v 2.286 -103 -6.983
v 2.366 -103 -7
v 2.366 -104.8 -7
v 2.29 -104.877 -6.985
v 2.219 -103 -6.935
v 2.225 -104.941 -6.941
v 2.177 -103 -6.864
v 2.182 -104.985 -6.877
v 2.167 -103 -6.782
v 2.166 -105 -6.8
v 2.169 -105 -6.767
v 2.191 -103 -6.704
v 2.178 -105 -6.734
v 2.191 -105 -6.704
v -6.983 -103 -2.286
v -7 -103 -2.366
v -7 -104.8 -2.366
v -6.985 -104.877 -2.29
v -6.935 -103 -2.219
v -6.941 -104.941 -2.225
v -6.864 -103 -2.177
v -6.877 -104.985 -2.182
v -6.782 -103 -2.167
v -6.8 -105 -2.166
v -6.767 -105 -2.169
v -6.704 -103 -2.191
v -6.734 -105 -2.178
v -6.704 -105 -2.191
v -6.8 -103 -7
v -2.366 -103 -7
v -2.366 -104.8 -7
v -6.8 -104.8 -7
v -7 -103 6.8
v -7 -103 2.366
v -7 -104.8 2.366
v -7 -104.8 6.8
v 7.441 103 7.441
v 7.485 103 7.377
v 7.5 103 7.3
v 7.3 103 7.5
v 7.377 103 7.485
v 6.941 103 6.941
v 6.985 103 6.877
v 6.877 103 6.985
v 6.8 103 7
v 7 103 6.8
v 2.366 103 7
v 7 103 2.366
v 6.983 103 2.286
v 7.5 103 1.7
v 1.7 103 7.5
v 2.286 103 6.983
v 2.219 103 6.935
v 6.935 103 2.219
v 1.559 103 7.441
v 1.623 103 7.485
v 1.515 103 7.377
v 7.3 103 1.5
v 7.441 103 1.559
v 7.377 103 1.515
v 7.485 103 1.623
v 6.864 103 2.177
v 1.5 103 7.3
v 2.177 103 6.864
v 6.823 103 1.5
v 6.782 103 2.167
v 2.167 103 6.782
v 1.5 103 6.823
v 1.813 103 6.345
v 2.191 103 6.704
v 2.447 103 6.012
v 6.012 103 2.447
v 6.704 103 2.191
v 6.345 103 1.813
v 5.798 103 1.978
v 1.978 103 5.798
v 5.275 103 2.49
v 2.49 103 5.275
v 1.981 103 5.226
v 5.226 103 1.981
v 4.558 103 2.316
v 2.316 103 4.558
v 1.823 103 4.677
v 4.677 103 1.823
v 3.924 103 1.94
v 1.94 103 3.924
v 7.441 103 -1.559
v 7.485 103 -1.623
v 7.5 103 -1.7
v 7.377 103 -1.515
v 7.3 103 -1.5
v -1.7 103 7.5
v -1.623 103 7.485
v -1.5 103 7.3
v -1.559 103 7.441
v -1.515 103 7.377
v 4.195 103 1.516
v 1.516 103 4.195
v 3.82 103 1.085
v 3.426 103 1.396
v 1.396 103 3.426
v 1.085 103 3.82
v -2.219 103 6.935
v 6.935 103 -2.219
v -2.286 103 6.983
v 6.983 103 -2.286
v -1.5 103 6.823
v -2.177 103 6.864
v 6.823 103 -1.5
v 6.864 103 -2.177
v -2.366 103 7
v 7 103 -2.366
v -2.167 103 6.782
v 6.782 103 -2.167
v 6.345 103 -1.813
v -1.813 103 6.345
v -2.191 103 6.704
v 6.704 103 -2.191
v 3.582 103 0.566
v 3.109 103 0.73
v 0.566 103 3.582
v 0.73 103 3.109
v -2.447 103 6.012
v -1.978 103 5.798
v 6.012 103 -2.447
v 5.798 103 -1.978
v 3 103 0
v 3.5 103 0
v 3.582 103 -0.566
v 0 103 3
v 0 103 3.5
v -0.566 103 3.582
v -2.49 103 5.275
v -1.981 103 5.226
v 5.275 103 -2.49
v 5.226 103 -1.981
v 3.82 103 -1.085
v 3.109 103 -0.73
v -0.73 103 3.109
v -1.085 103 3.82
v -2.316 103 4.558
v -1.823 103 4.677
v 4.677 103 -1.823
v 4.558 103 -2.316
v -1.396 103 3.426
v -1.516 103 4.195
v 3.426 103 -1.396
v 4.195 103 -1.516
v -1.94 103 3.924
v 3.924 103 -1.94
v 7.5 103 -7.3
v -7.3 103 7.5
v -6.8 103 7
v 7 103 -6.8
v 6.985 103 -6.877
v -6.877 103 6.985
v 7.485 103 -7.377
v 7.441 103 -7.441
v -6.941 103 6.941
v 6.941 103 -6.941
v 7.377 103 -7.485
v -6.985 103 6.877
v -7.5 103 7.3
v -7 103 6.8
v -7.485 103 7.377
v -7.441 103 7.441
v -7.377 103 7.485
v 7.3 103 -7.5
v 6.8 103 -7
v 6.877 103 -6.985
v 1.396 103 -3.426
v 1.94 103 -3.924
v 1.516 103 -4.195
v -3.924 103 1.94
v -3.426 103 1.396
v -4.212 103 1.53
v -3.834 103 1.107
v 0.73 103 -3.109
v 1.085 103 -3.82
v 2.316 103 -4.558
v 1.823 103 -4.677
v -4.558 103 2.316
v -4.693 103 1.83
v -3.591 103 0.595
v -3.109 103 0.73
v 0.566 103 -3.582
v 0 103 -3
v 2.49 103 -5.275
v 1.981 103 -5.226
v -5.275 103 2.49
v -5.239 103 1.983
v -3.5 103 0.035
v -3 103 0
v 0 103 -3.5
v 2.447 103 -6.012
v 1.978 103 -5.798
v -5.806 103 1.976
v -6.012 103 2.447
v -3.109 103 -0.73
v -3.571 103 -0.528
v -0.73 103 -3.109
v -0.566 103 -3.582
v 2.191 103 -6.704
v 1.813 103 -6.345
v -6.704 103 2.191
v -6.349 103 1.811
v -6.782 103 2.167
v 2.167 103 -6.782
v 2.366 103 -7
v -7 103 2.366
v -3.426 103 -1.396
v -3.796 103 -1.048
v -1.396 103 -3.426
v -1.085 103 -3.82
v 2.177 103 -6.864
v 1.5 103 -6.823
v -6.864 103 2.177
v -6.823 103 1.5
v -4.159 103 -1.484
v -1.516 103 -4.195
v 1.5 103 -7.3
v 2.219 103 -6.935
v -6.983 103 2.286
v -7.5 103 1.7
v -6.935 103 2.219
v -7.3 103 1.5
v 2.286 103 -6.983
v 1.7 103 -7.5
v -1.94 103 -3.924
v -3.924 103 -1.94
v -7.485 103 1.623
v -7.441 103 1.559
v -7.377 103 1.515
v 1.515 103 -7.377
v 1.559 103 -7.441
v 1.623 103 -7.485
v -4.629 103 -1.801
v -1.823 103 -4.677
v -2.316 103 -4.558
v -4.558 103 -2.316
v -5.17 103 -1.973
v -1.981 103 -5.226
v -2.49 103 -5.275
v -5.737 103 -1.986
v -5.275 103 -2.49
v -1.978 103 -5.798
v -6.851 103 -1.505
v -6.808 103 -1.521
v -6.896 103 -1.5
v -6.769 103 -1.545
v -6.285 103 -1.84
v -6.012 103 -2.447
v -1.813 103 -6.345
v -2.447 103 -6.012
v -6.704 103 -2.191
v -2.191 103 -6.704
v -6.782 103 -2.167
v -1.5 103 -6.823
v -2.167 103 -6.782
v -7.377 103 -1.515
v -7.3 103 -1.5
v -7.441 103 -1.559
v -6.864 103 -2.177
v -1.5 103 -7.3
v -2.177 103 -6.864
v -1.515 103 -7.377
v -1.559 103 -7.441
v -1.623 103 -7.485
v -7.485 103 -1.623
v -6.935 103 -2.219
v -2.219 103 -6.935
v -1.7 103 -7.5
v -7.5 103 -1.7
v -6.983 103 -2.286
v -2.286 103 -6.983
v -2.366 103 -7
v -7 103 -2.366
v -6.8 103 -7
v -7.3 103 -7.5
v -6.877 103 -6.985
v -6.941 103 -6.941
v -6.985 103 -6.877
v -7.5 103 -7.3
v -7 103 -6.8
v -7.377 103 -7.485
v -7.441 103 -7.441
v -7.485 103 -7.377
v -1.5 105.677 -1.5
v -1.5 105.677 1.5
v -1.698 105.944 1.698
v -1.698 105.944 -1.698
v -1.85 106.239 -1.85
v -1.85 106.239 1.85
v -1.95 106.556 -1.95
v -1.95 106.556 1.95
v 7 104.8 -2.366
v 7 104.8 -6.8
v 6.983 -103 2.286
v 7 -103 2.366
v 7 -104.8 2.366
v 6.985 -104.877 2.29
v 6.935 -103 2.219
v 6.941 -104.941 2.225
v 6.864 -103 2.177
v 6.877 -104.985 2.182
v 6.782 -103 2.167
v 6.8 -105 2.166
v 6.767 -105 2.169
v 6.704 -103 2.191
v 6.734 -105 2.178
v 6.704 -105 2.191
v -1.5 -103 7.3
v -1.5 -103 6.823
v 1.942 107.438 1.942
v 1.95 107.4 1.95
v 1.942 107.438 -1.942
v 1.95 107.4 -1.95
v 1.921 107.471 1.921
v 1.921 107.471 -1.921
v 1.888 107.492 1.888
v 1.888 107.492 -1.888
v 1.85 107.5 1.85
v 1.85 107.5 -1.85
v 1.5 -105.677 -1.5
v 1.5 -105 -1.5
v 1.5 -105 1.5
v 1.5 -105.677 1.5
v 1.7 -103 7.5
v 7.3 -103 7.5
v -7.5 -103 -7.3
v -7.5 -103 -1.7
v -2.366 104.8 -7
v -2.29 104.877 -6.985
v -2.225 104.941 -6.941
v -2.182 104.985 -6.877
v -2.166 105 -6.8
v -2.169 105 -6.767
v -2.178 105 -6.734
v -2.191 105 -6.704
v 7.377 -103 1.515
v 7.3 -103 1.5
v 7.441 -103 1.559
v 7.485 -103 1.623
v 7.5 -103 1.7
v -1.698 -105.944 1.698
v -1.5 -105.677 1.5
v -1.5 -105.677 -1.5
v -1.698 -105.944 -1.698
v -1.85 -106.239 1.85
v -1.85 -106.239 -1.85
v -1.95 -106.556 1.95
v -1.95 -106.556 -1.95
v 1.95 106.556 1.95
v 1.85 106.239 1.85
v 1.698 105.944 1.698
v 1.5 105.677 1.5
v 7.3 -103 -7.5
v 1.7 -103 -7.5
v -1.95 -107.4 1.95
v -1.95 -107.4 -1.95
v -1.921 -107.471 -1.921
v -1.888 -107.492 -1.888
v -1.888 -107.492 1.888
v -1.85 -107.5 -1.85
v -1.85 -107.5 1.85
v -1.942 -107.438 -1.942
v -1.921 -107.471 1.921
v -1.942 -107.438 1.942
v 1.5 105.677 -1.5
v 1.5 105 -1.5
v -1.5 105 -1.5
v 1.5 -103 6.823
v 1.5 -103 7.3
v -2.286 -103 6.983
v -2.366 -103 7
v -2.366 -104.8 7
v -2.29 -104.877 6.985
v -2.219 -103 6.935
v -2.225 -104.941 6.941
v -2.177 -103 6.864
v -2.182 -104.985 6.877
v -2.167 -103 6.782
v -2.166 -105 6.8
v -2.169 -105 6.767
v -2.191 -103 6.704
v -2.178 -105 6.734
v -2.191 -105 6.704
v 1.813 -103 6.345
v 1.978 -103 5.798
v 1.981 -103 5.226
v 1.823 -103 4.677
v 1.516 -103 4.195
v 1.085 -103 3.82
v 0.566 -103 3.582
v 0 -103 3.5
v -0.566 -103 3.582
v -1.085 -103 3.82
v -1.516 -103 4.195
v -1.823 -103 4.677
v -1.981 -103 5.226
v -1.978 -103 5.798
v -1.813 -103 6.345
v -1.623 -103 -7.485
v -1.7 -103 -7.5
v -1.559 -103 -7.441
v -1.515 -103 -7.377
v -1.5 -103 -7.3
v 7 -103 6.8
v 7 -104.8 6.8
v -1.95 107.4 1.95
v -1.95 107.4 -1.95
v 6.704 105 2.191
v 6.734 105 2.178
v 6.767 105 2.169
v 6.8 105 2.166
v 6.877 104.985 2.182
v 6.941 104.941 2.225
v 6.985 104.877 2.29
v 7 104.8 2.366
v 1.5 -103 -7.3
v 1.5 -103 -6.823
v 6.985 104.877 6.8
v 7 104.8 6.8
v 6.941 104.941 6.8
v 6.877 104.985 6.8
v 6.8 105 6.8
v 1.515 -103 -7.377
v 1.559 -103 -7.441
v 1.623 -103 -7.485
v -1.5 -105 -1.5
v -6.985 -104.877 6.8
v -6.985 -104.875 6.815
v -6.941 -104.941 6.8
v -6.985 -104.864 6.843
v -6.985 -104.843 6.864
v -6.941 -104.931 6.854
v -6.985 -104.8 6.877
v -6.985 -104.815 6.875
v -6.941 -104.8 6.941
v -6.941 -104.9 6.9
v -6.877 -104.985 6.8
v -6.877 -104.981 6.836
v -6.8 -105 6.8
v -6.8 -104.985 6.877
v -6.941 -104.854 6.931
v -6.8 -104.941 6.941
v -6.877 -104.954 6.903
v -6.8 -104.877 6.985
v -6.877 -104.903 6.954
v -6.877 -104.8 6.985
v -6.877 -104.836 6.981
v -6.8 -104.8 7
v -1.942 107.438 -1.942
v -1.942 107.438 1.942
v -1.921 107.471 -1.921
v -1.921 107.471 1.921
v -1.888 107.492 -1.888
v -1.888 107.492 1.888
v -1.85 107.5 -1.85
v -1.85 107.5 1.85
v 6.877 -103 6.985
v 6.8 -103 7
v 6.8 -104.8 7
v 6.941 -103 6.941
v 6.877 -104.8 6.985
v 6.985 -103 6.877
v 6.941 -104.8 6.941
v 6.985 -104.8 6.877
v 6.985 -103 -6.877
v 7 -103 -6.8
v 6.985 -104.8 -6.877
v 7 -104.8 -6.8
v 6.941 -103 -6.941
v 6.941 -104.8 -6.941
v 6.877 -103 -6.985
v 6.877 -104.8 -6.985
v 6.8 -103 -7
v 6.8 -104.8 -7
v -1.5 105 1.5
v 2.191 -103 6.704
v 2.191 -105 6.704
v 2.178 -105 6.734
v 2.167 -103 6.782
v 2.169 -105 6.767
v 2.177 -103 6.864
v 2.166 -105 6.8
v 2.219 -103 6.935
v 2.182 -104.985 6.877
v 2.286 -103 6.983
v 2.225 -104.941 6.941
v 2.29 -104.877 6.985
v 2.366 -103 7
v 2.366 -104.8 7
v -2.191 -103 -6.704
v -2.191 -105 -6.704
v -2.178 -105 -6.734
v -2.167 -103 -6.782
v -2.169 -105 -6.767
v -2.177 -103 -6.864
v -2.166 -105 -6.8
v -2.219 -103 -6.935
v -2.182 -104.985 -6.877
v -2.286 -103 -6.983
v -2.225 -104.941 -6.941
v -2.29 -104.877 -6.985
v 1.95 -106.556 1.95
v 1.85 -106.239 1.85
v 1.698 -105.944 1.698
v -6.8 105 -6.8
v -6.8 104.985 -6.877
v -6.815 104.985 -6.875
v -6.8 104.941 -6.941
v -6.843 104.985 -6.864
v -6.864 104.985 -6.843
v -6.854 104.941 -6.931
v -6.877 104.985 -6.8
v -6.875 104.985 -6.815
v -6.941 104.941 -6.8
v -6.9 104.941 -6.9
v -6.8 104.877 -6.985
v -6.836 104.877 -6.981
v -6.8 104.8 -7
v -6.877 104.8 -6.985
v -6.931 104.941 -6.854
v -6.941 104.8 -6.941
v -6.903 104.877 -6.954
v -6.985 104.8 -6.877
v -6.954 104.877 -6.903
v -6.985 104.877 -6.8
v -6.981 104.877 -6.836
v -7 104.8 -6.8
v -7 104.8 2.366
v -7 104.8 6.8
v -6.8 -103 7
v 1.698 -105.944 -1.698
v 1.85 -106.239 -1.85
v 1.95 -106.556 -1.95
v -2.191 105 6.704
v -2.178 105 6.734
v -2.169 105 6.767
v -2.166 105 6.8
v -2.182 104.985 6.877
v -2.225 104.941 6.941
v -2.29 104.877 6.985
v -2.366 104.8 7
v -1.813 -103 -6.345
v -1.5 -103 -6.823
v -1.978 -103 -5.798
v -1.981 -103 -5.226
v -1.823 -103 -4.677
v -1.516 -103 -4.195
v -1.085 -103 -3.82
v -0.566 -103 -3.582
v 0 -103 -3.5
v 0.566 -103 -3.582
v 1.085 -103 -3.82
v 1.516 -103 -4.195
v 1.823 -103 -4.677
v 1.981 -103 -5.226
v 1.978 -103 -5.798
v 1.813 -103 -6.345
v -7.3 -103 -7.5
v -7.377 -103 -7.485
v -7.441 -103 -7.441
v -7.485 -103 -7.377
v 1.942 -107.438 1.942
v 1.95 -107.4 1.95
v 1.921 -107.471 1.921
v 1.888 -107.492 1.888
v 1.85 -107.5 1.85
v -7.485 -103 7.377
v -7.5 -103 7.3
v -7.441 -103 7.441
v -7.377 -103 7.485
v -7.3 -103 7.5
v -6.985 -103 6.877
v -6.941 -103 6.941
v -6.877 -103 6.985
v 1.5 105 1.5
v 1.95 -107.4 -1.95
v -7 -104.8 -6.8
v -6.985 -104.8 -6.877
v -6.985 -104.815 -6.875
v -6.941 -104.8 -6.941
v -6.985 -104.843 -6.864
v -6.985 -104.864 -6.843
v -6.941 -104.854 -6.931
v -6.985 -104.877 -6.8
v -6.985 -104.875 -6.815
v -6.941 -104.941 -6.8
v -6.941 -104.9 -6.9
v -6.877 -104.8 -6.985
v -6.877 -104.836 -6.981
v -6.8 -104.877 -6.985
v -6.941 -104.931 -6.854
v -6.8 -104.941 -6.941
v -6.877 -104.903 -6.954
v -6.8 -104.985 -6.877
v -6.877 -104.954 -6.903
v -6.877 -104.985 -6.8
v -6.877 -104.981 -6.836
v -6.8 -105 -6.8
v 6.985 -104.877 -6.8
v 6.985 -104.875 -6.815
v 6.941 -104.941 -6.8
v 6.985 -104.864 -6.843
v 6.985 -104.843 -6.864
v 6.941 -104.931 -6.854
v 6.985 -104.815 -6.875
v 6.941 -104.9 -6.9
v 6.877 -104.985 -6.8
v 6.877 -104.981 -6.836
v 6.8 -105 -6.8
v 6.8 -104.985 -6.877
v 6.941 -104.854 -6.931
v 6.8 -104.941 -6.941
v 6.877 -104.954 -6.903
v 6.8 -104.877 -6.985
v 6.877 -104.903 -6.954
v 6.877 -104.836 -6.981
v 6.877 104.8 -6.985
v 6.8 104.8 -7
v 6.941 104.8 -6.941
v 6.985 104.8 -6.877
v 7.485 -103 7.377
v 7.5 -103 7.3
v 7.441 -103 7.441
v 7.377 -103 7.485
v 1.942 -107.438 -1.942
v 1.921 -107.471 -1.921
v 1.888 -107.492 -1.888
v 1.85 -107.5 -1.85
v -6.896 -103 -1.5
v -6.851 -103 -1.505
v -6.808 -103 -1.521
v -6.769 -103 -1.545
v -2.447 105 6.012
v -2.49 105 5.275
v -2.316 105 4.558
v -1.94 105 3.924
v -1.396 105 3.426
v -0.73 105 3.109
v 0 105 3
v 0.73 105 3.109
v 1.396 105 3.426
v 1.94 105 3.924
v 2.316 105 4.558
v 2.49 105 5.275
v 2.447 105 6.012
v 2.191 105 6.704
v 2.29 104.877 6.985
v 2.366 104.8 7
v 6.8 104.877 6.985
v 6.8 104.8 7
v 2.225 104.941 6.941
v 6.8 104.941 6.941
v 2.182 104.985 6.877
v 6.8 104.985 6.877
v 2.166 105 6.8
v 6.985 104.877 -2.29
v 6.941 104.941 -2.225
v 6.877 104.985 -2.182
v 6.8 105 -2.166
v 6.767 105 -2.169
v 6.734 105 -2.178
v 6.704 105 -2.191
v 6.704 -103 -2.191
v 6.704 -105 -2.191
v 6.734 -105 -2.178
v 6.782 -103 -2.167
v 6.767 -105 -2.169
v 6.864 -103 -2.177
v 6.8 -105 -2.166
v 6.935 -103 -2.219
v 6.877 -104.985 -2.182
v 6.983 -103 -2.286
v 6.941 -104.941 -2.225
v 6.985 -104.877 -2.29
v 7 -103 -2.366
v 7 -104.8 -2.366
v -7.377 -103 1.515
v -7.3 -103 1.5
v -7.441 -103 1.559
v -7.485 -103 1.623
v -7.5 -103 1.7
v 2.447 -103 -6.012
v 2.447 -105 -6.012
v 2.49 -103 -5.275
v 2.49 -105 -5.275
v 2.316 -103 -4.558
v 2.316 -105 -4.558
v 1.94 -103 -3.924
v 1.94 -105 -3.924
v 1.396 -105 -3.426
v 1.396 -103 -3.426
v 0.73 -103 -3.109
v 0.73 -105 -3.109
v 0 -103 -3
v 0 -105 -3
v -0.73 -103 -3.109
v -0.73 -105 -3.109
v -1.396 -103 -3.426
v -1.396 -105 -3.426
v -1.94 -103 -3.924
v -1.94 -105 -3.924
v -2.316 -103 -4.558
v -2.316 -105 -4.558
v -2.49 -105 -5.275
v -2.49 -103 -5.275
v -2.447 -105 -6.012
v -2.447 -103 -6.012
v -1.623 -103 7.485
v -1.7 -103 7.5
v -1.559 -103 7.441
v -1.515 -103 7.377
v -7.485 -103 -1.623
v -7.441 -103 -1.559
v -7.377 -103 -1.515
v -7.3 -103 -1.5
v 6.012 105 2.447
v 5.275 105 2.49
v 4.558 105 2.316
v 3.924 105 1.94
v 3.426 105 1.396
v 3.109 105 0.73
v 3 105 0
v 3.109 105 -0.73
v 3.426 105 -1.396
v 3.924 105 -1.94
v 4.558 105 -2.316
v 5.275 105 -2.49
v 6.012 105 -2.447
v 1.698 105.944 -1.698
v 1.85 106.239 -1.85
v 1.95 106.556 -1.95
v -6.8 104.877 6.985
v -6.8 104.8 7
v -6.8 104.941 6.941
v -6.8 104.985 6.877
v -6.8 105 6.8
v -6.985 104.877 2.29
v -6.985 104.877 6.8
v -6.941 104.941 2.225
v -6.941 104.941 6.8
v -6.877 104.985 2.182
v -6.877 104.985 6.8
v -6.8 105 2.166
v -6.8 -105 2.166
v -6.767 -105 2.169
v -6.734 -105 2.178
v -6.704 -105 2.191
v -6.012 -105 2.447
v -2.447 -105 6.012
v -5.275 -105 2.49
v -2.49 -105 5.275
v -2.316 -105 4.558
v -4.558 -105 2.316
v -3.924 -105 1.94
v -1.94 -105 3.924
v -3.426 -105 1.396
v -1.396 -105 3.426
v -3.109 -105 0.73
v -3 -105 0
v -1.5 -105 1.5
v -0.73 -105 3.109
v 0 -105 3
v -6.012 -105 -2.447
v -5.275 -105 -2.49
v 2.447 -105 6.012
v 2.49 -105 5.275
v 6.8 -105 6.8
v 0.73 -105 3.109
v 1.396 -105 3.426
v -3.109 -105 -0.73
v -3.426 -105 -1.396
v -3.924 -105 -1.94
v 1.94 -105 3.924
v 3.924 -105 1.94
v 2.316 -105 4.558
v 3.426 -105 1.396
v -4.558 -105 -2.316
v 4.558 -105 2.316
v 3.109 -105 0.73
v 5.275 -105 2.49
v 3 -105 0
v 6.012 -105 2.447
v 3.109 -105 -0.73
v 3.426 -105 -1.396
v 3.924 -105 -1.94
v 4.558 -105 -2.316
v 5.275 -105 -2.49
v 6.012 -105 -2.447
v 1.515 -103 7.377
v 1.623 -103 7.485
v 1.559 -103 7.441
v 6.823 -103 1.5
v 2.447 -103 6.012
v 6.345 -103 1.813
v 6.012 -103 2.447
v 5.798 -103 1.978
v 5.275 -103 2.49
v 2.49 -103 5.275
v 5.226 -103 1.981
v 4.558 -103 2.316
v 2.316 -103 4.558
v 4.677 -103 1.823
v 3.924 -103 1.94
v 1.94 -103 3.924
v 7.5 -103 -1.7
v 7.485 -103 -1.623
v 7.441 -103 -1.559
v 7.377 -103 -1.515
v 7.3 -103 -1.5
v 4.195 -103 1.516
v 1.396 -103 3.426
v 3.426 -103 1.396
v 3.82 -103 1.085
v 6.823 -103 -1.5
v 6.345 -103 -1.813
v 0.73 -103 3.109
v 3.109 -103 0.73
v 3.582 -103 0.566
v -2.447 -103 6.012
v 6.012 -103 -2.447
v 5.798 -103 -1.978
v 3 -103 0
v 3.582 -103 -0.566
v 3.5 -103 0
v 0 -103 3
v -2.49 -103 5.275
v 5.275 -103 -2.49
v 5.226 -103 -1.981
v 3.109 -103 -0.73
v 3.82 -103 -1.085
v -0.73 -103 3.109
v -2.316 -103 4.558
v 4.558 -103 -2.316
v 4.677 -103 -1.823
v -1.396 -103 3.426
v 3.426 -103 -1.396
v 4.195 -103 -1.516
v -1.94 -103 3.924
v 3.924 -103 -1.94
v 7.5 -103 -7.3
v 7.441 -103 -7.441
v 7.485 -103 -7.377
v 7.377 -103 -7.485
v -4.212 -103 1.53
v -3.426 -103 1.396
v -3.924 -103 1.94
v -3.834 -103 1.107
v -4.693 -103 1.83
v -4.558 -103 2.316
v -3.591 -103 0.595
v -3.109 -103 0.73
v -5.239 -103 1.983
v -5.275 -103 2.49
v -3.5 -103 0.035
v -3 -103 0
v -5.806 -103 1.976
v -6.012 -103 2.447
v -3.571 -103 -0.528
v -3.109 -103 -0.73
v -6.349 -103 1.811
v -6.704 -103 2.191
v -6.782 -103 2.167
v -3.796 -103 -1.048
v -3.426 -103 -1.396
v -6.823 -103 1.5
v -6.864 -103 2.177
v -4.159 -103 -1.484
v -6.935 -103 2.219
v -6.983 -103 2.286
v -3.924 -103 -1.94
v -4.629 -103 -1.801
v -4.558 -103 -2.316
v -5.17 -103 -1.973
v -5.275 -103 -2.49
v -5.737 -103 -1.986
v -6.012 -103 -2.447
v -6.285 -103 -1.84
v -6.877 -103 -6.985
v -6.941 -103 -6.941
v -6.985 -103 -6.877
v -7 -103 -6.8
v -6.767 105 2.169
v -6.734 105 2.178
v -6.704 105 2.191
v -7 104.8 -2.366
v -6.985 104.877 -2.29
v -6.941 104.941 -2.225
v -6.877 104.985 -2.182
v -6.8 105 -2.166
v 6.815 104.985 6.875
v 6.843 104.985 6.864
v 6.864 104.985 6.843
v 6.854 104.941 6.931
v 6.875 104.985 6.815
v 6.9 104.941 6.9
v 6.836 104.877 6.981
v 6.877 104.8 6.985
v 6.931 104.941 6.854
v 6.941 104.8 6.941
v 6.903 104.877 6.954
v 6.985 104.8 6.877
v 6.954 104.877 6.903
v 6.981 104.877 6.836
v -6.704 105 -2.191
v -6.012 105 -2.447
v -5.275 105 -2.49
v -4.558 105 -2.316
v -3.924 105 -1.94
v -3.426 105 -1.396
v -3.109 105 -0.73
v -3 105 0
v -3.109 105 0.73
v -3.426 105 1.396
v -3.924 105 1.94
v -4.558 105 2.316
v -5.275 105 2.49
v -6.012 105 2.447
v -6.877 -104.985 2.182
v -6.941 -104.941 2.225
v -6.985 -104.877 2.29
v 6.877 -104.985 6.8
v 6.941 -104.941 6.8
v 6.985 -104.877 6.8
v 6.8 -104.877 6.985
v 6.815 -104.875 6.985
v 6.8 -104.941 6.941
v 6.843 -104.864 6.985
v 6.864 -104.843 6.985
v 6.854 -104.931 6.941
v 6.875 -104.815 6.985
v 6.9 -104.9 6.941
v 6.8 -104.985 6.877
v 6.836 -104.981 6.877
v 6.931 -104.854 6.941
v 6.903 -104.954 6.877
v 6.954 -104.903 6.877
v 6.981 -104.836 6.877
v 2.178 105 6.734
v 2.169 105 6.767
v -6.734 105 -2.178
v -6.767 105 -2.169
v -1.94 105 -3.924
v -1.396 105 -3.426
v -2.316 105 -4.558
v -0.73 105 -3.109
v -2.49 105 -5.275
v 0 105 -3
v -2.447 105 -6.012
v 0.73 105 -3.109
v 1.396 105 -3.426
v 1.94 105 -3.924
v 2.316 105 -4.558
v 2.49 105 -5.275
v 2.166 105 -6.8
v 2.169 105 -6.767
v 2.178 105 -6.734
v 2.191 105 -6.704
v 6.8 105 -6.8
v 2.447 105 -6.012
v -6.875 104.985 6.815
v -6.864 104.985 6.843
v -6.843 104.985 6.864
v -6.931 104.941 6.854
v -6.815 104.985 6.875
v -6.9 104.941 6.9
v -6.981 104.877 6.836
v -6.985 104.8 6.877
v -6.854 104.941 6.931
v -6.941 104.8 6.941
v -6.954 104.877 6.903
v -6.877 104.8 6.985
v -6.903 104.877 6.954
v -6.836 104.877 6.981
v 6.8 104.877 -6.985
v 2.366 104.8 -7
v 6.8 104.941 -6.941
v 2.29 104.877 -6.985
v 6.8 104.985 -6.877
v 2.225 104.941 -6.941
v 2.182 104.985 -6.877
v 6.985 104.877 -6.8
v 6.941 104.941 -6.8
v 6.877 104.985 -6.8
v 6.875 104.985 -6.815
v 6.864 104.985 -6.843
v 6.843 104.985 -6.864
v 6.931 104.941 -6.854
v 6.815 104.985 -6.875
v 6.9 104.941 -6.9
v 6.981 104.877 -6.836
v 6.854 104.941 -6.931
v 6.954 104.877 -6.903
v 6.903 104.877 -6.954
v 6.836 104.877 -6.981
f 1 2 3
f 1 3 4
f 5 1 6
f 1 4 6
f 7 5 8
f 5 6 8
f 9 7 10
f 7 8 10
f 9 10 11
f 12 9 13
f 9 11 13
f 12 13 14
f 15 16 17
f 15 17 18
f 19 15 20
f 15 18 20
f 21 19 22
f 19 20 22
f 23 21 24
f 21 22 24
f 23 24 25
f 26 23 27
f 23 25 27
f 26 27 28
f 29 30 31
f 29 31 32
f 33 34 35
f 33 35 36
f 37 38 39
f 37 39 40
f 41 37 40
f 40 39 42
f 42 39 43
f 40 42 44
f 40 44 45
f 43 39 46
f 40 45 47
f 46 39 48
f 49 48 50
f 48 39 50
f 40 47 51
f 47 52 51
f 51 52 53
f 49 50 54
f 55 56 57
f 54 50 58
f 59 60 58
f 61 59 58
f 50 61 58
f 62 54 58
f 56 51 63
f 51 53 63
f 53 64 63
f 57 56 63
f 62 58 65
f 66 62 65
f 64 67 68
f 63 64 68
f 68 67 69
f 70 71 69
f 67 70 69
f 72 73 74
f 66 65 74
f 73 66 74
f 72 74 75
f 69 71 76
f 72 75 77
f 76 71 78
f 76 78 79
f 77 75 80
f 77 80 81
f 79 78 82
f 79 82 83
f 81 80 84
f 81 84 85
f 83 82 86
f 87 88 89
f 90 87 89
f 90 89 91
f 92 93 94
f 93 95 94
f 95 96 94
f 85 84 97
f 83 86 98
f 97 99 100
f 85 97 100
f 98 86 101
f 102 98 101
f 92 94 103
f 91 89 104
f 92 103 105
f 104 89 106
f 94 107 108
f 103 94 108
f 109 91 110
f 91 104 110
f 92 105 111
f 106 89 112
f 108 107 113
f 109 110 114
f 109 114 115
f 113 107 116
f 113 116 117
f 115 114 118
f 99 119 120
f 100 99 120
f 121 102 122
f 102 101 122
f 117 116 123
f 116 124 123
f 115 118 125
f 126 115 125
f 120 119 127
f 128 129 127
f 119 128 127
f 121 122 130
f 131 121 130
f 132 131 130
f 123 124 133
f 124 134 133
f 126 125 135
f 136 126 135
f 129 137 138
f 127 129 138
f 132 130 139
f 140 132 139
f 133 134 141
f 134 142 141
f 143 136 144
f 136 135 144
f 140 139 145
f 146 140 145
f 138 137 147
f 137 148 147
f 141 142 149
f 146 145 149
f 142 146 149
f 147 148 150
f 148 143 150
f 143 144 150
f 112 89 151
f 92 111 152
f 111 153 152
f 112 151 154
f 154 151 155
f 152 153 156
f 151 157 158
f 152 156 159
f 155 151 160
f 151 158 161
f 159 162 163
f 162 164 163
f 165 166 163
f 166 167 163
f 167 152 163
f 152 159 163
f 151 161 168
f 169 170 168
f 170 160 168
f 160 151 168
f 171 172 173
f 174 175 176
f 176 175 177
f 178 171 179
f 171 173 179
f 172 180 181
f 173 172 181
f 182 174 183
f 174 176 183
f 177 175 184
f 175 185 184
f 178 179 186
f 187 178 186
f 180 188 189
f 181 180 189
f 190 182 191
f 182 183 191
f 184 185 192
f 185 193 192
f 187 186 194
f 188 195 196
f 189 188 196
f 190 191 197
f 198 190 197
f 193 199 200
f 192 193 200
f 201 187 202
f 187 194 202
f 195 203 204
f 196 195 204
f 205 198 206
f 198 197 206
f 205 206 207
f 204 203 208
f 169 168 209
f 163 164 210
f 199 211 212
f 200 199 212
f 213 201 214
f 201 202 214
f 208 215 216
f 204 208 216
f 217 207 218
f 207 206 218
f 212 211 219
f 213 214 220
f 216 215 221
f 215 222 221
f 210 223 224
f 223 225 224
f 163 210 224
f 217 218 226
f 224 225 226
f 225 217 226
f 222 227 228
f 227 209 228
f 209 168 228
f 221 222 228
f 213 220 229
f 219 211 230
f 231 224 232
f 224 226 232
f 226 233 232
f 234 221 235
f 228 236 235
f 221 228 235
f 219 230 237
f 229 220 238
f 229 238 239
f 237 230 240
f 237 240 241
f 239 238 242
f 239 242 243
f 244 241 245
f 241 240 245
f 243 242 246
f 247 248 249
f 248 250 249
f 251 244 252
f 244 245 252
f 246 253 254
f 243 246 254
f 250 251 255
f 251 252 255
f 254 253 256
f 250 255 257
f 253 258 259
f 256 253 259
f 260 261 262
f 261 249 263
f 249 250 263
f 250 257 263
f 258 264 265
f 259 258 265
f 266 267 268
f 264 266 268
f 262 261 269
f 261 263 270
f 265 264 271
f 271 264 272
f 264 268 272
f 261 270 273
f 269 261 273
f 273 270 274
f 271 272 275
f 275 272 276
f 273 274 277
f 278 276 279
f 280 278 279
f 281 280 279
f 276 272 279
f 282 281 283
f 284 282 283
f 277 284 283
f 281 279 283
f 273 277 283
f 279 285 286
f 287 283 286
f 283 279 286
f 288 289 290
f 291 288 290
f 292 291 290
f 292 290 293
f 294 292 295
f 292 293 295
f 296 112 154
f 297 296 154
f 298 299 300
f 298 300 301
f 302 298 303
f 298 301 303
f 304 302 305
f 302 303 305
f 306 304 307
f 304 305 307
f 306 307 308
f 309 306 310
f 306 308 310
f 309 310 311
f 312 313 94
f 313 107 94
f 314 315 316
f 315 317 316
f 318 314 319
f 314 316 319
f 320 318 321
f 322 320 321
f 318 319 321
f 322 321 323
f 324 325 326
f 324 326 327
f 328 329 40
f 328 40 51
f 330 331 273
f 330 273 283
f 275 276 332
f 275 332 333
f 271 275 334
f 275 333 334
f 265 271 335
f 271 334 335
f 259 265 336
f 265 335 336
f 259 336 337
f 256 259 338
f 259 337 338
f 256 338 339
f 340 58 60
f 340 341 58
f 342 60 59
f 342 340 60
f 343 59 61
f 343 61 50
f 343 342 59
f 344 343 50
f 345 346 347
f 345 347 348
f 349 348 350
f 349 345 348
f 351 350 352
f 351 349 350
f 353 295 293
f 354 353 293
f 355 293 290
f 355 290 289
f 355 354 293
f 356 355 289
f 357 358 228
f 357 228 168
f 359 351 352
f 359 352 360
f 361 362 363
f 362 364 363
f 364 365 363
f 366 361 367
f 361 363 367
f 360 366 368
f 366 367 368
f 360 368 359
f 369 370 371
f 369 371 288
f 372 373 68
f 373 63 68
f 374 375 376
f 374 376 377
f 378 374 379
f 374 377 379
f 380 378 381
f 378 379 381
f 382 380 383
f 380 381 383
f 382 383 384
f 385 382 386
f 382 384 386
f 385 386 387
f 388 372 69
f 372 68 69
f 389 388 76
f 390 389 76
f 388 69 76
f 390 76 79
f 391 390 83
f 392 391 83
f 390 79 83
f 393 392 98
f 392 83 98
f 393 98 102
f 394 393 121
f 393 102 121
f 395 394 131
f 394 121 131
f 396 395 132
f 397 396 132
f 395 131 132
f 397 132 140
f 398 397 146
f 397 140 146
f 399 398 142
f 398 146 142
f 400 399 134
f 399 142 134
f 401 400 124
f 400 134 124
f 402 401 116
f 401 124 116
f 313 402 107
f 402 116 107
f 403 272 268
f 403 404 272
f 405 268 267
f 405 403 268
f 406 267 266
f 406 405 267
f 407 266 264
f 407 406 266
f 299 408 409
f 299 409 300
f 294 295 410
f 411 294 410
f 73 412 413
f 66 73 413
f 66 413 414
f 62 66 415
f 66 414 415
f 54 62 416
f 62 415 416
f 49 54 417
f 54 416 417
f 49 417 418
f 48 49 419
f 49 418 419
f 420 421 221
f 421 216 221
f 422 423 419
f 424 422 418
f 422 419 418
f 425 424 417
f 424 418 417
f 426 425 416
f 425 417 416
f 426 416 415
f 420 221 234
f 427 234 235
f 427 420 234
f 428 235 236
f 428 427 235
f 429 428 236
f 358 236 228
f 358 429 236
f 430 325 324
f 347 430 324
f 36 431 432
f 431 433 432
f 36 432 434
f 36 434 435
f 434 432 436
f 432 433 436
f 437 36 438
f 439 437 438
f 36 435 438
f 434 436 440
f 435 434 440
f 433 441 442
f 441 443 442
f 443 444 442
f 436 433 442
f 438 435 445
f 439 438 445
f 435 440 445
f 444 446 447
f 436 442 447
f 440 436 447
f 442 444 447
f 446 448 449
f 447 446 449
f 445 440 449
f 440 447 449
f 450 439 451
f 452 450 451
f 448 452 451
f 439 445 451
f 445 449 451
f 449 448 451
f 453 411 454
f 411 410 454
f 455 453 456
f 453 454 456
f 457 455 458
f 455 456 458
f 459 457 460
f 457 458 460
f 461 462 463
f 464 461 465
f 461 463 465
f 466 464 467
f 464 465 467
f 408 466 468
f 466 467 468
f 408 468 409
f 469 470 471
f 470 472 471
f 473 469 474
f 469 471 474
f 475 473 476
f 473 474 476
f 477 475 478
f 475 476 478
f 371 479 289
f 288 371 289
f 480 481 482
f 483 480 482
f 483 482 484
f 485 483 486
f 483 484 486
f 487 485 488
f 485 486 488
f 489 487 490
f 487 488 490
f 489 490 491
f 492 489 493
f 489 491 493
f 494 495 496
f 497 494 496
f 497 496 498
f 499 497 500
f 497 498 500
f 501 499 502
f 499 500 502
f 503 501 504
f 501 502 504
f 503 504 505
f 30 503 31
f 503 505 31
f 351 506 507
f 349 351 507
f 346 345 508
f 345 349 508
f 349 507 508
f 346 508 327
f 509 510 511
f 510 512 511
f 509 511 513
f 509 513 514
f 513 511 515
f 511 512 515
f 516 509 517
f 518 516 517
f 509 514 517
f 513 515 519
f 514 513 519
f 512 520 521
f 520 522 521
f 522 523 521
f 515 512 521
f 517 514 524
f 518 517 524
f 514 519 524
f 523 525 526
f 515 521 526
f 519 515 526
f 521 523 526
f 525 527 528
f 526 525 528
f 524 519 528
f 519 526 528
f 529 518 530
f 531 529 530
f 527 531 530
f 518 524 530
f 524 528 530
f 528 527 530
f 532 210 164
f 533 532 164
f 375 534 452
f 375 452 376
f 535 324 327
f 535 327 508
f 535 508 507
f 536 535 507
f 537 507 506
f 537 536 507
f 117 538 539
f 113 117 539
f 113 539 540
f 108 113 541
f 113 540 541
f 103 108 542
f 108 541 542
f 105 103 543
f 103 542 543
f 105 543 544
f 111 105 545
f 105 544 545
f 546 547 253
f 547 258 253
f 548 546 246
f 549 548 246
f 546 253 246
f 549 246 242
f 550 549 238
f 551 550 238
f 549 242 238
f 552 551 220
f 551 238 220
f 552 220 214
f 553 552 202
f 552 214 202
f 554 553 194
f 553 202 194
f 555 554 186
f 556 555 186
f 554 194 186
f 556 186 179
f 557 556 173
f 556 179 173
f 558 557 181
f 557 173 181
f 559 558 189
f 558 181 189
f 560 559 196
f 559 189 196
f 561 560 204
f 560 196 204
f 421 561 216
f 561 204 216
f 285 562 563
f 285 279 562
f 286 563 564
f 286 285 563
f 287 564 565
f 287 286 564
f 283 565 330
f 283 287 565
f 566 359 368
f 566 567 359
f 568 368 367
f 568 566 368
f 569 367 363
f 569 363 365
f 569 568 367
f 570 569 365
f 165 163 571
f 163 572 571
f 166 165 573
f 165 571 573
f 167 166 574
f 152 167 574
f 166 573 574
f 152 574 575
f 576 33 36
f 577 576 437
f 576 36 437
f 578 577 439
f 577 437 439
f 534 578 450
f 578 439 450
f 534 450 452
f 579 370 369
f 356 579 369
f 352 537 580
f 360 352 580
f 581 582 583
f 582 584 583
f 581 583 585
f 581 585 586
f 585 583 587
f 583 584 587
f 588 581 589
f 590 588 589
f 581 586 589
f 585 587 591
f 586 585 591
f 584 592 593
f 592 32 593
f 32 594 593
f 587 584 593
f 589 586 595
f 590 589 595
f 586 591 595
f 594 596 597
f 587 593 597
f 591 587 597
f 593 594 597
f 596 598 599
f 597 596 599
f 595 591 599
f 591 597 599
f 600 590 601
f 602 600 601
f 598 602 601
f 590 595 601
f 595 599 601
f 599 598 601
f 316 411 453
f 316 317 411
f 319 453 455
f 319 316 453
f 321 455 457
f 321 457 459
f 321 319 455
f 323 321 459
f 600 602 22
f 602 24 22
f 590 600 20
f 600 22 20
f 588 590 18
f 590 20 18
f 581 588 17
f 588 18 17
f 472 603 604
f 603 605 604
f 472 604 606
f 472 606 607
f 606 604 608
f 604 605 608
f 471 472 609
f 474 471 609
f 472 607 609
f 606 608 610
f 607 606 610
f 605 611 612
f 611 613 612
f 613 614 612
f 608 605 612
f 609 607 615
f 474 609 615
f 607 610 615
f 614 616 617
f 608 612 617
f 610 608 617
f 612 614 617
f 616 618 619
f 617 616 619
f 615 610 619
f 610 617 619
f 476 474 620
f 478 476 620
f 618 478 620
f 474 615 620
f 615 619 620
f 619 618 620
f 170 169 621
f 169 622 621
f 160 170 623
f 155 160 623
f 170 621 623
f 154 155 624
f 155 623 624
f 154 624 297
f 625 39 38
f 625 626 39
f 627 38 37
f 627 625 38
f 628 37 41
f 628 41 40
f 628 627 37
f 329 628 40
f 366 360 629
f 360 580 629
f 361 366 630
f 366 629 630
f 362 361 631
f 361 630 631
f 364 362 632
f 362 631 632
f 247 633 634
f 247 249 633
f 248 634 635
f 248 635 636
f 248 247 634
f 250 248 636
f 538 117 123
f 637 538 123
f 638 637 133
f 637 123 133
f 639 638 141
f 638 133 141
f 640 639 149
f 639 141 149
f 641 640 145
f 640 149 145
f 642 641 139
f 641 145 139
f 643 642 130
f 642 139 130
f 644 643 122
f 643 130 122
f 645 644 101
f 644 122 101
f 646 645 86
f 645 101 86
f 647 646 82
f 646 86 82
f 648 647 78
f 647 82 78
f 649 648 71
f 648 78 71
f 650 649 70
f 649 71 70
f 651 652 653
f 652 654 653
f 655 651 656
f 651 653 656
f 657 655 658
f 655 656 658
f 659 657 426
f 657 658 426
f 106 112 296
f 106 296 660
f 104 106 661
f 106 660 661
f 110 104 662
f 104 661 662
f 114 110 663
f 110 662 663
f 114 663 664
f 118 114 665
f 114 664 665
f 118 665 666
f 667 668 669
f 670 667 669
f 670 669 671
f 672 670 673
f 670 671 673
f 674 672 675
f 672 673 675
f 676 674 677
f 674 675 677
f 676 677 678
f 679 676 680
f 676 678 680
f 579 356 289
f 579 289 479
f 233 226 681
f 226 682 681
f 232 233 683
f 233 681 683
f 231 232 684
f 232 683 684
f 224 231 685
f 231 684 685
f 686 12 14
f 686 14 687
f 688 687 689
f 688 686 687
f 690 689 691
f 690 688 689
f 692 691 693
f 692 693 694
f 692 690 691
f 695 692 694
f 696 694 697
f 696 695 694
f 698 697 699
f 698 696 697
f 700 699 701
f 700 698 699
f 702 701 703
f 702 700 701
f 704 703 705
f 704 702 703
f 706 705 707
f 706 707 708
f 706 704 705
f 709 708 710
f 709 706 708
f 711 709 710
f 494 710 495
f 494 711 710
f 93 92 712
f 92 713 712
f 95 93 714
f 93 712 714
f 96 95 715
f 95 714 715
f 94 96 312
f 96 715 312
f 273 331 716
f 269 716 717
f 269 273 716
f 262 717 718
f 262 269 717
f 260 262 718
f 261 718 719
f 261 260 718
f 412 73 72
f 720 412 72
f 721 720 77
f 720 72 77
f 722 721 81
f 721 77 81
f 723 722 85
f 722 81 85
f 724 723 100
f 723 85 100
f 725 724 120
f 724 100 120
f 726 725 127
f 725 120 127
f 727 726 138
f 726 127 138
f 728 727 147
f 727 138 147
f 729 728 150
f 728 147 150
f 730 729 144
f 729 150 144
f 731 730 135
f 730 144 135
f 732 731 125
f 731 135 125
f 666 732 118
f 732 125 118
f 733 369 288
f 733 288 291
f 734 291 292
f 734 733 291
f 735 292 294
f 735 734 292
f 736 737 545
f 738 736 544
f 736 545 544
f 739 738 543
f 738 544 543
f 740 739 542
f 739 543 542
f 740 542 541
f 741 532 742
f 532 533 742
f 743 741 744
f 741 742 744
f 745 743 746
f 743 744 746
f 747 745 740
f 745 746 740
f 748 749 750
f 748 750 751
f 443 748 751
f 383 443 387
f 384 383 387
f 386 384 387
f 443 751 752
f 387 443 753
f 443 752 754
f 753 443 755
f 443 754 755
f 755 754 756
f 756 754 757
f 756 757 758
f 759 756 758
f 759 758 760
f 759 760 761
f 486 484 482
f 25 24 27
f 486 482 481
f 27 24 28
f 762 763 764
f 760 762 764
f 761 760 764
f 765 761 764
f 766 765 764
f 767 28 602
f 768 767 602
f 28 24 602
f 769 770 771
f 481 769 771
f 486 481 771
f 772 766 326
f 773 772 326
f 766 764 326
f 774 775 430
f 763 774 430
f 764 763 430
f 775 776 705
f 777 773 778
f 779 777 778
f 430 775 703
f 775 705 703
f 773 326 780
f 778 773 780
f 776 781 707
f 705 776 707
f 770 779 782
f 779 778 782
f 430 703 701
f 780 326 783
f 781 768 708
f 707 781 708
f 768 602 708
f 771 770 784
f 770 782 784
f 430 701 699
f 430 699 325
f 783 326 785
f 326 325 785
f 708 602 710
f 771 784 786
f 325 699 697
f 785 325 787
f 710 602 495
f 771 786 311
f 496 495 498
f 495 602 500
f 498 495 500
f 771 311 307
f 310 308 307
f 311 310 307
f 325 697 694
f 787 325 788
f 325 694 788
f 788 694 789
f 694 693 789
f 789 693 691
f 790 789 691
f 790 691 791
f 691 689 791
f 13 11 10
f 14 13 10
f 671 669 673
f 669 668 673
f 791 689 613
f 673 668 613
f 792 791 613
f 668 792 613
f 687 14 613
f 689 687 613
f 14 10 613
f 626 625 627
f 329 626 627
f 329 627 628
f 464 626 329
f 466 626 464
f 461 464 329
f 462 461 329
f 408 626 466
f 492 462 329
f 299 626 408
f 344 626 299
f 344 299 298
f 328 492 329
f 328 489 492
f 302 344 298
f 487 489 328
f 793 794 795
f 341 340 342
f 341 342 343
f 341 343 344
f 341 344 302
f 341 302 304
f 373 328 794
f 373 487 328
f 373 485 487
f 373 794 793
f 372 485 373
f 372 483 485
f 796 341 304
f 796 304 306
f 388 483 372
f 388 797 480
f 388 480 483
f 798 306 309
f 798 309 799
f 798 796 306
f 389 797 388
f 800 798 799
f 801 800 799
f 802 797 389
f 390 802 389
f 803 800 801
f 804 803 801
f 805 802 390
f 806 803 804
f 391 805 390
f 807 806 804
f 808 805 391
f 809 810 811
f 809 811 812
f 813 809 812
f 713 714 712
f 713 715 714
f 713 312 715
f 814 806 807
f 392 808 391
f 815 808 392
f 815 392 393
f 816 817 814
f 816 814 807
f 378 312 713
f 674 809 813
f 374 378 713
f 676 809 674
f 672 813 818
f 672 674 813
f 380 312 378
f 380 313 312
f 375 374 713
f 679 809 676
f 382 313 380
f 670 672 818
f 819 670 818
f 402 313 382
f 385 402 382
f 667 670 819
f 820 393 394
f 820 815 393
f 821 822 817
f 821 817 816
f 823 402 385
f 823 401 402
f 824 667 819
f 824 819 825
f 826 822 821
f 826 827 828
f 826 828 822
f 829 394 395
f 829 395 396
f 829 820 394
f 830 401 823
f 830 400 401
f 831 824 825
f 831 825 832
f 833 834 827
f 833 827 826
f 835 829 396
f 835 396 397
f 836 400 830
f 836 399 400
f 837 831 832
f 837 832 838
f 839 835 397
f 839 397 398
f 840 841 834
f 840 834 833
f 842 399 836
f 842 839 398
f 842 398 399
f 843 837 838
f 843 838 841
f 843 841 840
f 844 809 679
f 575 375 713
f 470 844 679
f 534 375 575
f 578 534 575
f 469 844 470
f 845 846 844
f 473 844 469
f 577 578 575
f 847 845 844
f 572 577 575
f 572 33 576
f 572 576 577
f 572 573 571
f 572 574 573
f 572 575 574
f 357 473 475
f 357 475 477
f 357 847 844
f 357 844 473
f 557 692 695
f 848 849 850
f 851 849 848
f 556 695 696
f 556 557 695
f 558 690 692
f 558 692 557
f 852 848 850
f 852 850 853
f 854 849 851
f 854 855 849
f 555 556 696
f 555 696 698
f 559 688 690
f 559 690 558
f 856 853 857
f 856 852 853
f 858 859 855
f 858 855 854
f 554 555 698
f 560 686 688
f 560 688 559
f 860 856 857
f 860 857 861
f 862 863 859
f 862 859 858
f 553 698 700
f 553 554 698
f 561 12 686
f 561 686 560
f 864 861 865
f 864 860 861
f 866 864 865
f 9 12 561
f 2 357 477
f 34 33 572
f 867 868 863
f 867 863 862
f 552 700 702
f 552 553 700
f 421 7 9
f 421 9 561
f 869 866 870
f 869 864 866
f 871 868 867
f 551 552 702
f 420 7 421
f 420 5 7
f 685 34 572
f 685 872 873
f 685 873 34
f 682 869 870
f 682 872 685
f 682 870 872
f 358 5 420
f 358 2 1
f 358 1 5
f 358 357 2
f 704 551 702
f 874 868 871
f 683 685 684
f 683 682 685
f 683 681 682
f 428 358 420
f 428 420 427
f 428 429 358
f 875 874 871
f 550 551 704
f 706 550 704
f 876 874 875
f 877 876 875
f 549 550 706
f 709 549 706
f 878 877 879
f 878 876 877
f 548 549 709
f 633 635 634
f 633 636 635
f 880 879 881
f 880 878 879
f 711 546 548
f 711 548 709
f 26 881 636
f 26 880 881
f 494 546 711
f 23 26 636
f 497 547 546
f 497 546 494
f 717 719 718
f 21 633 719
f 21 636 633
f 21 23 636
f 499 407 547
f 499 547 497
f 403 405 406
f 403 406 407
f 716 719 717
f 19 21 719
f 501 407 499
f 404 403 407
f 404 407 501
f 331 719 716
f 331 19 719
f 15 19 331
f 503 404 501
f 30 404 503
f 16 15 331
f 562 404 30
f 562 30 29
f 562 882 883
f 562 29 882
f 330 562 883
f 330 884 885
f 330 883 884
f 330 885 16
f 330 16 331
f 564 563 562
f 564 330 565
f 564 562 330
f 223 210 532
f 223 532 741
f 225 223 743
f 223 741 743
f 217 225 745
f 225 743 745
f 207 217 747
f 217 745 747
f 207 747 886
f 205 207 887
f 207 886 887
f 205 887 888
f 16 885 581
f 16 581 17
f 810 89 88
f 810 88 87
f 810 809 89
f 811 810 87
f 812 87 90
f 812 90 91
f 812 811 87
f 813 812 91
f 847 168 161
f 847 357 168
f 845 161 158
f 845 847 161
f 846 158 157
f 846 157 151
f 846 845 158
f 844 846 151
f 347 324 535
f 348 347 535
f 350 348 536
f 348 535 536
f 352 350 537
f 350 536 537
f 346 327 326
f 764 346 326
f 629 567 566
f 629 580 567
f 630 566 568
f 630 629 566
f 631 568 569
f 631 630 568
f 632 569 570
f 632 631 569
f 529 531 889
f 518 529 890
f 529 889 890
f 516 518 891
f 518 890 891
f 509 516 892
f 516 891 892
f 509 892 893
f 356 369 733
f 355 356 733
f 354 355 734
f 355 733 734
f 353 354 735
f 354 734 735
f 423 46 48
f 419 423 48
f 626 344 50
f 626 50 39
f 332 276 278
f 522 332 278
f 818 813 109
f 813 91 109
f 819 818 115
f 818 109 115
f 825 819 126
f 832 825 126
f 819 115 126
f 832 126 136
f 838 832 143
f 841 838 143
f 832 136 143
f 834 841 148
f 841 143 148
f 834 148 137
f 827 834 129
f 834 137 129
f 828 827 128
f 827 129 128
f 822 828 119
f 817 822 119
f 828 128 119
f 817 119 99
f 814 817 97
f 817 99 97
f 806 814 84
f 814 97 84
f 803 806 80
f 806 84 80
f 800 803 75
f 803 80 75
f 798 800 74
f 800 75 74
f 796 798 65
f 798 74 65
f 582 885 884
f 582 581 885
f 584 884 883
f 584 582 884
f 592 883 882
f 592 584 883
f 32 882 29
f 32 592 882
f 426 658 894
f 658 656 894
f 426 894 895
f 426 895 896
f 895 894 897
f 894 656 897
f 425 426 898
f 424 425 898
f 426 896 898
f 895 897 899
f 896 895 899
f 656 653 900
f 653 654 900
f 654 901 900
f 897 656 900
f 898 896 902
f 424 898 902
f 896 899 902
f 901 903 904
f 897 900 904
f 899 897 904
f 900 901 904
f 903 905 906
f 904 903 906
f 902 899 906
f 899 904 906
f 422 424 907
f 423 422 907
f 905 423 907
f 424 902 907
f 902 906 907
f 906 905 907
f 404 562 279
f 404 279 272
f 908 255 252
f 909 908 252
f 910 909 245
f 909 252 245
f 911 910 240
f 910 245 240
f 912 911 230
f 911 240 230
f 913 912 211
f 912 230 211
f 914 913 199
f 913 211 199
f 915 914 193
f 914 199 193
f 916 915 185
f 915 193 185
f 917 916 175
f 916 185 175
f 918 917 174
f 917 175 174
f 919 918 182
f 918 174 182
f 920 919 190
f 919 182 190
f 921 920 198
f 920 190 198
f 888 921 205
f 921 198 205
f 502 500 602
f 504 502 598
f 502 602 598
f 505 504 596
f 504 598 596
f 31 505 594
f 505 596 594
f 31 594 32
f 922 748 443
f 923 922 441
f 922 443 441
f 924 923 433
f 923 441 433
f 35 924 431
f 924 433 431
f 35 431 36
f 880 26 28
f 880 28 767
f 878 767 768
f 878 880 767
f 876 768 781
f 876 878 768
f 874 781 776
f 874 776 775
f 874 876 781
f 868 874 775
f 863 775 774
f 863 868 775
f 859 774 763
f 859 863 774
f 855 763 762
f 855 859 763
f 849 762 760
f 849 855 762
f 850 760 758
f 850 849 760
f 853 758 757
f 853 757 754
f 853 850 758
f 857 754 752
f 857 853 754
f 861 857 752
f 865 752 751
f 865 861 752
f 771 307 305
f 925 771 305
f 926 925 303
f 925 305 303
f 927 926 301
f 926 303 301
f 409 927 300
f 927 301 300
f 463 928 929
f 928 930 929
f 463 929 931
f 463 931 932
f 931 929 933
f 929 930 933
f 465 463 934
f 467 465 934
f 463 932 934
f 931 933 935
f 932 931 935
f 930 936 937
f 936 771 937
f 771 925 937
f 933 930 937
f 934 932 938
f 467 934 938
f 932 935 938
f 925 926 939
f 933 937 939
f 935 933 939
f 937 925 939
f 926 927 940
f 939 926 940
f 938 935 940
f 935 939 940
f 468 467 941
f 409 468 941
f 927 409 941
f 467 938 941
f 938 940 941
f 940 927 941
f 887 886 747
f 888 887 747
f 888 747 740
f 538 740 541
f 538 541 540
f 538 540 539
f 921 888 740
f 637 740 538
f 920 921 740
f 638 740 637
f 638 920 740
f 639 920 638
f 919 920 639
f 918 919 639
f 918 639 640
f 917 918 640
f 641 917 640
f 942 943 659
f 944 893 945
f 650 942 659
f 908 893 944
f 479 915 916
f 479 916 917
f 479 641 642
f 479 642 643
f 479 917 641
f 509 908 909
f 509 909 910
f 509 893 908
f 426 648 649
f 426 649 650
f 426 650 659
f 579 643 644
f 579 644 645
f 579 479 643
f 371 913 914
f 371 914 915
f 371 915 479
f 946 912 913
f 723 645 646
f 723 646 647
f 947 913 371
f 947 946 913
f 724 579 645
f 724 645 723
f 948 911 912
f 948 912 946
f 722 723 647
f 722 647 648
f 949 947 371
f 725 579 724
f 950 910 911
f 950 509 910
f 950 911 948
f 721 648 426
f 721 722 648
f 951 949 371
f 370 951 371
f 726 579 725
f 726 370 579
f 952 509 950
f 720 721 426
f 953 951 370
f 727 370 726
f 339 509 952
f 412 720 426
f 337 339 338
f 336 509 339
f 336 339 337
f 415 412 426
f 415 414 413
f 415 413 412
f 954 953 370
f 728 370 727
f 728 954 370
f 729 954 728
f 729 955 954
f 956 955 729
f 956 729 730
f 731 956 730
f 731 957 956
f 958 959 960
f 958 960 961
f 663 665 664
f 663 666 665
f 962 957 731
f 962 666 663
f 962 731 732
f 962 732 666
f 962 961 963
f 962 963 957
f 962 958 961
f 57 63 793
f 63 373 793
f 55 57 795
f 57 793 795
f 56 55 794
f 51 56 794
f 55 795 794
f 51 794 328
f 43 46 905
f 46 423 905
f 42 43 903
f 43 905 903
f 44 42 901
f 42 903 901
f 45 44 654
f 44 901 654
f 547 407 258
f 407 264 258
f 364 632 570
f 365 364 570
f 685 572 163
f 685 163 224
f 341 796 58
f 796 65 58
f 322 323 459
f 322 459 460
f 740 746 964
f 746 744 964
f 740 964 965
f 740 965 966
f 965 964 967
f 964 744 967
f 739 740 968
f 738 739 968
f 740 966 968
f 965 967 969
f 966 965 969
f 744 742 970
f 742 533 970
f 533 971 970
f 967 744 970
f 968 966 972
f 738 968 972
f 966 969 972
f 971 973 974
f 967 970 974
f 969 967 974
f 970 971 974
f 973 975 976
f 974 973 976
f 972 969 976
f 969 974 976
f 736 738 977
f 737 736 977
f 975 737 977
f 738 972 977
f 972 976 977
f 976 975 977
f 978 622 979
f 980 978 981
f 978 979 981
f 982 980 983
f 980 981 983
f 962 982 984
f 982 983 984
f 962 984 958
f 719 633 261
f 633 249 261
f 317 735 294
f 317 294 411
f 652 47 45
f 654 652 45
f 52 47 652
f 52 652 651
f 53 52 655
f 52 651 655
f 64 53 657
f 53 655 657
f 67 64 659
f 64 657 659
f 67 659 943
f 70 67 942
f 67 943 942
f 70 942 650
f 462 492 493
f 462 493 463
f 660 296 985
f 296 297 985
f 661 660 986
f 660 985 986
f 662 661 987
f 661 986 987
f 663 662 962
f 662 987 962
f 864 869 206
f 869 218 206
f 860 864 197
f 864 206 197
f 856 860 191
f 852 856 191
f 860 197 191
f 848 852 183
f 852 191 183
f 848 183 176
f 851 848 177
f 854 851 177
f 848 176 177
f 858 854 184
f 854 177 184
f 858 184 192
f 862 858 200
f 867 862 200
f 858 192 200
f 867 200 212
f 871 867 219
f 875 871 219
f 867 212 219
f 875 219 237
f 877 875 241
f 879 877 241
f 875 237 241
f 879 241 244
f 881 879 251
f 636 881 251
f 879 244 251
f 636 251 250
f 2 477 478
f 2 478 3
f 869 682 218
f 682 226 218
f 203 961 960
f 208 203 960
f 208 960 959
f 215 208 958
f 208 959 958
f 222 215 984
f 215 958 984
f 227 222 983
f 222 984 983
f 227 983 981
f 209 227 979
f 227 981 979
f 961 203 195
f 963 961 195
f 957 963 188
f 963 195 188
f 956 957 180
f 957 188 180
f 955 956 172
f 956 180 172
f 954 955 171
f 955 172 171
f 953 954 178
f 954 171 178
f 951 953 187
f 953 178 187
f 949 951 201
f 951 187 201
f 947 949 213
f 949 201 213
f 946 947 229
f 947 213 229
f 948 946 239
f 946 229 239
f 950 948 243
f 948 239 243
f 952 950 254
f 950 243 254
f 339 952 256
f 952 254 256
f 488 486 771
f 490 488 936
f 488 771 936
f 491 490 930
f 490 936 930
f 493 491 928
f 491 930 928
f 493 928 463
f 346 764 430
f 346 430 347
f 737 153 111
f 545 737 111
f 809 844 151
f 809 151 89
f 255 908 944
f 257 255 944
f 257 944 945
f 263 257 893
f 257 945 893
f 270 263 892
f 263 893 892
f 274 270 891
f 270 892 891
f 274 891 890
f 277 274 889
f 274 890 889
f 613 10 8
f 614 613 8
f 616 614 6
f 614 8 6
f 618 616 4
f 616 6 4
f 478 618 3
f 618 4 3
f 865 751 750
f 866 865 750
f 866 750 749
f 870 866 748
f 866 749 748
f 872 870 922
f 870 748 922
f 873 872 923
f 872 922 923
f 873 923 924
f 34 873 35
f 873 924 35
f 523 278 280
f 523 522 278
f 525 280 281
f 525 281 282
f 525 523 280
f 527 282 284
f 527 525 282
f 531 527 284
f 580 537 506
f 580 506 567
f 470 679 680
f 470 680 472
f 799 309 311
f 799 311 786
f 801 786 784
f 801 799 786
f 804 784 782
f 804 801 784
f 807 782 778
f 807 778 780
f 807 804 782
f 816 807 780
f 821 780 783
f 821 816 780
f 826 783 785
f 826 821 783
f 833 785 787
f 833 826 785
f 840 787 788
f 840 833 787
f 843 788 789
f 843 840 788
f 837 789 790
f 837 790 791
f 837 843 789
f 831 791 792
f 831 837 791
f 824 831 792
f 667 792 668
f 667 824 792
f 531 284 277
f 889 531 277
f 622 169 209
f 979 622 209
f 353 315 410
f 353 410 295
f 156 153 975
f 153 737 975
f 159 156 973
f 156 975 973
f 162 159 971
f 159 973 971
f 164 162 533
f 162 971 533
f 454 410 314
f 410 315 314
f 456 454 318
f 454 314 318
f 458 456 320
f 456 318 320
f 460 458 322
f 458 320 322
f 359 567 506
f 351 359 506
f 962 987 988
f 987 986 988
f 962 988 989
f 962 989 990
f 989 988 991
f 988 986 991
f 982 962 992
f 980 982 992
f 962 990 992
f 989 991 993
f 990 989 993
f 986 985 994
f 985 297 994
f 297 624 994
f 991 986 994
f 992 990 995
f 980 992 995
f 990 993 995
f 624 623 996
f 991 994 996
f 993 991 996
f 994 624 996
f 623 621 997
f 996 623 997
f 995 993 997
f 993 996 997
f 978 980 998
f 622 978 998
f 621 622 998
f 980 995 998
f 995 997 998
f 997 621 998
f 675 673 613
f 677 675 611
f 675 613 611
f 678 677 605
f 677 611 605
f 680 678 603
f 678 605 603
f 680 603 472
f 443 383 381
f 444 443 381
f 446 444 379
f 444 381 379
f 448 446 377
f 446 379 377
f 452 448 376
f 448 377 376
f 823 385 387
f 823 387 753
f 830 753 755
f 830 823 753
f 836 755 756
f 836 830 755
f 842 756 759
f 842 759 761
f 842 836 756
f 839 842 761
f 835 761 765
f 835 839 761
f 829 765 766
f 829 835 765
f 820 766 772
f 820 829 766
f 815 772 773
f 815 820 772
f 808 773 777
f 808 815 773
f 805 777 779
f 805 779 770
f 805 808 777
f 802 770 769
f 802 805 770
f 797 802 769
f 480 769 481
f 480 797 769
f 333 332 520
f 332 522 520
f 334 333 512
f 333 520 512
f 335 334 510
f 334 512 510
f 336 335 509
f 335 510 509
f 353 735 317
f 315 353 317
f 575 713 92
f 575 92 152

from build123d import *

# Parameters (mm, degrees)
EXTRUDE_1_DEPTH     = 103
EXTRUDE_2_DEPTH     = 2
EXTRUDE_3_DEPTH     = 2
CUT_EXTRUDE_1_DEPTH = 2.5
FILLET_1_R          = 0.1
FILLET_2_R          = 0.2
FILLET_3_R          = 0.2


with BuildPart() as part:
    # 草图1 → 凸台-拉伸1 (new body)
    with BuildSketch(Plane(origin=(0, 0, 0), x_dir=(1, 0, 0), z_dir=(0, 1, 0))):
        with BuildLine():
            Line((-7.5, 7.5), (-1.5, 7.5))
            Line((-1.5, 7.5), (-1.5, 6.822875656))
            ThreePointArc((-1.5, 6.822875656), (0, 3.5), (1.5, 6.822875656))
            Line((1.5, 6.822875656), (1.5, 7.5))
            Line((1.5, 7.5), (7.5, 7.5))
            Line((7.5, 7.5), (7.5, 1.5))
            Line((7.5, 1.5), (6.822875656, 1.5))
            ThreePointArc((6.822875656, 1.5), (3.5, 0), (6.822875656, -1.5))
            Line((6.822875656, -1.5), (7.5, -1.5))
            Line((7.5, -1.5), (7.5, -7.5))
            Line((7.5, -7.5), (1.5, -7.5))
            Line((1.5, -7.5), (1.5, -6.822875656))
            ThreePointArc((1.5, -6.822875656), (0, -3.5), (-1.5, -6.822875656))
            Line((-1.5, -6.822875656), (-1.5, -7.5))
            Line((-1.5, -7.5), (-7.5, -7.5))
            Line((-7.5, -7.5), (-7.5, -1.5))
            Line((-7.5, -1.5), (-6.822875656, -1.5))
            ThreePointArc((-6.822875656, -1.5), (-3.5, 0), (-6.822875656, 1.5))
            Line((-6.822875656, 1.5), (-7.5, 1.5))
            Line((-7.5, 1.5), (-7.5, 7.5))
        make_face()
    extrude_1 = extrude(amount=EXTRUDE_1_DEPTH)

    # 草图2 → 凸台-拉伸2 (add)
    with BuildSketch(Plane(origin=(0, 103, 0), x_dir=(1, 0, 0), z_dir=(0, 1, 0))):
        with BuildLine():
            Line((-7, 7), (-7, 2))
            ThreePointArc((-7, 2), (-3, 0), (-7, -2))
            Line((-7, -2), (-7, -7))
            Line((-7, -7), (-2, -7))
            ThreePointArc((-2, -7), (0, -3), (2, -7))
            Line((2, -7), (7, -7))
            Line((7, -7), (7, -2))
            ThreePointArc((7, -2), (3, 0), (7, 2))
            Line((7, 2), (7, 7))
            Line((7, 7), (2, 7))
            ThreePointArc((2, 7), (0, 3), (-2, 7))
            Line((-2, 7), (-7, 7))
        make_face()
    extrude_2 = extrude(amount=EXTRUDE_2_DEPTH)

    # 草图3 → 凸台-拉伸3 (add, symmetric)
    with BuildSketch(Plane(origin=(0, 0, 0), x_dir=(0, 0, -1), z_dir=(1, 0, 0))):
        with BuildLine():
            Line((-1.5, 105), (1.5, 105))
            Line((1.5, 105), (1.5, 105.677124344))
            ThreePointArc((1.5, 105.677124344), (1.780042303, 106.088161527), (1.95, 106.555590279))
            Line((1.95, 106.555590279), (1.95, 107.5))
            Line((1.95, 107.5), (-1.95, 107.5))
            Line((-1.95, 107.5), (-1.95, 106.555590279))
            ThreePointArc((-1.95, 106.555590279), (-1.780042303, 106.088161527), (-1.5, 105.677124344))
            Line((-1.5, 105.677124344), (-1.5, 105))
        make_face()
    extrude_3 = extrude(amount=EXTRUDE_3_DEPTH, both=True)

    # 草图4 → 切除-拉伸1 (cut, symmetric)
    with BuildSketch(Plane.XY):
        with BuildLine():
            Line((1.5, 105), (1.5, 105.677124344))
            ThreePointArc((1.5, 105.677124344), (1.780042303, 106.088161527), (1.95, 106.555590279))
            Line((1.95, 106.555590279), (1.95, 107.5))
            Line((1.95, 107.5), (2.5, 107.5))
            Line((2.5, 107.5), (2.5, 105))
            Line((2.5, 105), (1.5, 105))
        make_face()
        with BuildLine():
            Line((-1.5, 105), (-1.5, 105.677124344))
            ThreePointArc((-1.5, 105.677124344), (-1.780042303, 106.088161527), (-1.95, 106.555590279))
            Line((-1.95, 106.555590279), (-1.95, 107.5))
            Line((-1.95, 107.5), (-2.5, 107.5))
            Line((-2.5, 107.5), (-2.5, 105))
            Line((-2.5, 105), (-1.5, 105))
        make_face()
    cut_extrude_1 = extrude(amount=CUT_EXTRUDE_1_DEPTH, both=True, mode=Mode.SUBTRACT)

    # 镜向1: 凸台-拉伸1, 凸台-拉伸2, 凸台-拉伸3, 切除-拉伸1 across plane
    add(extrude_1.mirror(Plane.ZX))
    add(extrude_2.mirror(Plane.ZX))
    add(extrude_3.mirror(Plane.ZX))
    add(cut_extrude_1.mirror(Plane.ZX), mode=Mode.SUBTRACT)

    # 圆角1
    fillet_1_edges = [part.edges().sort_by_distance(p)[0] for p in [
        (0, 107.5, -1.95),
        (0, 107.5, 1.95),
        (-1.95, 107.5, 0),
        (1.95, 107.5, 0),
        (0, -107.5, 1.95),
        (0, -107.5, -1.95),
        (-1.95, -107.5, 0),
        (1.95, -107.5, 0),
    ]]
    fillet(fillet_1_edges, radius=FILLET_1_R)

    # 圆角2
    fillet_2_edges = [part.edges().sort_by_distance(p)[0] for p in [
        (-4.5, -105, -7),
        (-7, -104, -7),
        (-2, -104, -7),
        (4.5, -105, -7),
        (2, -104, -7),
        (7, -105, -4.5),
        (7, -104, -7),
        (7, -104, -2),
        (7, -105, 4.5),
        (7, -104, 2),
        (4.5, -105, 7),
        (7, -104, 7),
        (2, -104, 7),
        (-4.5, -105, 7),
        (-2, -104, 7),
        (-7, -105, 4.5),
        (-7, -104, 7),
        (-7, -104, 2),
        (-7, -105, -4.5),
        (-7, -104, -2),
        (-2, 104, -7),
        (-7, 104, -7),
        (-7, 104, -2),
        (-7, 104, 2),
        (-7, 104, 7),
        (-2, 104, 7),
        (2, 104, 7),
        (7, 104, 7),
        (7, 104, 2),
        (7, 104, -2),
        (7, 104, -7),
        (2, 104, -7),
        (-4.5, 105, -7),
        (-7, 105, -4.5),
        (-7, 105, 4.5),
        (-4.5, 105, 7),
        (4.5, 105, 7),
        (7, 105, 4.5),
        (7, 105, -4.5),
        (4.5, 105, -7),
    ]]
    fillet(fillet_2_edges, radius=FILLET_2_R)

    # 圆角3
    fillet_3_edges = [part.edges().sort_by_distance(p)[0] for p in [
        (-7.5, 0, -7.5),
        (-1.5, 0, -7.5),
        (1.5, 0, -7.5),
        (7.5, 0, -7.5),
        (7.5, 0, -1.5),
        (7.5, 0, 1.5),
        (7.5, 0, 7.5),
        (1.5, 0, 7.5),
        (-1.5, 0, 7.5),
        (-7.5, 0, 7.5),
        (-7.5, 0, 1.5),
        (-6.822875656, 0, -1.5),
        (-7.5, 0, -1.5),
    ]]
    fillet(fillet_3_edges, radius=FILLET_3_R)


solid = part.part
